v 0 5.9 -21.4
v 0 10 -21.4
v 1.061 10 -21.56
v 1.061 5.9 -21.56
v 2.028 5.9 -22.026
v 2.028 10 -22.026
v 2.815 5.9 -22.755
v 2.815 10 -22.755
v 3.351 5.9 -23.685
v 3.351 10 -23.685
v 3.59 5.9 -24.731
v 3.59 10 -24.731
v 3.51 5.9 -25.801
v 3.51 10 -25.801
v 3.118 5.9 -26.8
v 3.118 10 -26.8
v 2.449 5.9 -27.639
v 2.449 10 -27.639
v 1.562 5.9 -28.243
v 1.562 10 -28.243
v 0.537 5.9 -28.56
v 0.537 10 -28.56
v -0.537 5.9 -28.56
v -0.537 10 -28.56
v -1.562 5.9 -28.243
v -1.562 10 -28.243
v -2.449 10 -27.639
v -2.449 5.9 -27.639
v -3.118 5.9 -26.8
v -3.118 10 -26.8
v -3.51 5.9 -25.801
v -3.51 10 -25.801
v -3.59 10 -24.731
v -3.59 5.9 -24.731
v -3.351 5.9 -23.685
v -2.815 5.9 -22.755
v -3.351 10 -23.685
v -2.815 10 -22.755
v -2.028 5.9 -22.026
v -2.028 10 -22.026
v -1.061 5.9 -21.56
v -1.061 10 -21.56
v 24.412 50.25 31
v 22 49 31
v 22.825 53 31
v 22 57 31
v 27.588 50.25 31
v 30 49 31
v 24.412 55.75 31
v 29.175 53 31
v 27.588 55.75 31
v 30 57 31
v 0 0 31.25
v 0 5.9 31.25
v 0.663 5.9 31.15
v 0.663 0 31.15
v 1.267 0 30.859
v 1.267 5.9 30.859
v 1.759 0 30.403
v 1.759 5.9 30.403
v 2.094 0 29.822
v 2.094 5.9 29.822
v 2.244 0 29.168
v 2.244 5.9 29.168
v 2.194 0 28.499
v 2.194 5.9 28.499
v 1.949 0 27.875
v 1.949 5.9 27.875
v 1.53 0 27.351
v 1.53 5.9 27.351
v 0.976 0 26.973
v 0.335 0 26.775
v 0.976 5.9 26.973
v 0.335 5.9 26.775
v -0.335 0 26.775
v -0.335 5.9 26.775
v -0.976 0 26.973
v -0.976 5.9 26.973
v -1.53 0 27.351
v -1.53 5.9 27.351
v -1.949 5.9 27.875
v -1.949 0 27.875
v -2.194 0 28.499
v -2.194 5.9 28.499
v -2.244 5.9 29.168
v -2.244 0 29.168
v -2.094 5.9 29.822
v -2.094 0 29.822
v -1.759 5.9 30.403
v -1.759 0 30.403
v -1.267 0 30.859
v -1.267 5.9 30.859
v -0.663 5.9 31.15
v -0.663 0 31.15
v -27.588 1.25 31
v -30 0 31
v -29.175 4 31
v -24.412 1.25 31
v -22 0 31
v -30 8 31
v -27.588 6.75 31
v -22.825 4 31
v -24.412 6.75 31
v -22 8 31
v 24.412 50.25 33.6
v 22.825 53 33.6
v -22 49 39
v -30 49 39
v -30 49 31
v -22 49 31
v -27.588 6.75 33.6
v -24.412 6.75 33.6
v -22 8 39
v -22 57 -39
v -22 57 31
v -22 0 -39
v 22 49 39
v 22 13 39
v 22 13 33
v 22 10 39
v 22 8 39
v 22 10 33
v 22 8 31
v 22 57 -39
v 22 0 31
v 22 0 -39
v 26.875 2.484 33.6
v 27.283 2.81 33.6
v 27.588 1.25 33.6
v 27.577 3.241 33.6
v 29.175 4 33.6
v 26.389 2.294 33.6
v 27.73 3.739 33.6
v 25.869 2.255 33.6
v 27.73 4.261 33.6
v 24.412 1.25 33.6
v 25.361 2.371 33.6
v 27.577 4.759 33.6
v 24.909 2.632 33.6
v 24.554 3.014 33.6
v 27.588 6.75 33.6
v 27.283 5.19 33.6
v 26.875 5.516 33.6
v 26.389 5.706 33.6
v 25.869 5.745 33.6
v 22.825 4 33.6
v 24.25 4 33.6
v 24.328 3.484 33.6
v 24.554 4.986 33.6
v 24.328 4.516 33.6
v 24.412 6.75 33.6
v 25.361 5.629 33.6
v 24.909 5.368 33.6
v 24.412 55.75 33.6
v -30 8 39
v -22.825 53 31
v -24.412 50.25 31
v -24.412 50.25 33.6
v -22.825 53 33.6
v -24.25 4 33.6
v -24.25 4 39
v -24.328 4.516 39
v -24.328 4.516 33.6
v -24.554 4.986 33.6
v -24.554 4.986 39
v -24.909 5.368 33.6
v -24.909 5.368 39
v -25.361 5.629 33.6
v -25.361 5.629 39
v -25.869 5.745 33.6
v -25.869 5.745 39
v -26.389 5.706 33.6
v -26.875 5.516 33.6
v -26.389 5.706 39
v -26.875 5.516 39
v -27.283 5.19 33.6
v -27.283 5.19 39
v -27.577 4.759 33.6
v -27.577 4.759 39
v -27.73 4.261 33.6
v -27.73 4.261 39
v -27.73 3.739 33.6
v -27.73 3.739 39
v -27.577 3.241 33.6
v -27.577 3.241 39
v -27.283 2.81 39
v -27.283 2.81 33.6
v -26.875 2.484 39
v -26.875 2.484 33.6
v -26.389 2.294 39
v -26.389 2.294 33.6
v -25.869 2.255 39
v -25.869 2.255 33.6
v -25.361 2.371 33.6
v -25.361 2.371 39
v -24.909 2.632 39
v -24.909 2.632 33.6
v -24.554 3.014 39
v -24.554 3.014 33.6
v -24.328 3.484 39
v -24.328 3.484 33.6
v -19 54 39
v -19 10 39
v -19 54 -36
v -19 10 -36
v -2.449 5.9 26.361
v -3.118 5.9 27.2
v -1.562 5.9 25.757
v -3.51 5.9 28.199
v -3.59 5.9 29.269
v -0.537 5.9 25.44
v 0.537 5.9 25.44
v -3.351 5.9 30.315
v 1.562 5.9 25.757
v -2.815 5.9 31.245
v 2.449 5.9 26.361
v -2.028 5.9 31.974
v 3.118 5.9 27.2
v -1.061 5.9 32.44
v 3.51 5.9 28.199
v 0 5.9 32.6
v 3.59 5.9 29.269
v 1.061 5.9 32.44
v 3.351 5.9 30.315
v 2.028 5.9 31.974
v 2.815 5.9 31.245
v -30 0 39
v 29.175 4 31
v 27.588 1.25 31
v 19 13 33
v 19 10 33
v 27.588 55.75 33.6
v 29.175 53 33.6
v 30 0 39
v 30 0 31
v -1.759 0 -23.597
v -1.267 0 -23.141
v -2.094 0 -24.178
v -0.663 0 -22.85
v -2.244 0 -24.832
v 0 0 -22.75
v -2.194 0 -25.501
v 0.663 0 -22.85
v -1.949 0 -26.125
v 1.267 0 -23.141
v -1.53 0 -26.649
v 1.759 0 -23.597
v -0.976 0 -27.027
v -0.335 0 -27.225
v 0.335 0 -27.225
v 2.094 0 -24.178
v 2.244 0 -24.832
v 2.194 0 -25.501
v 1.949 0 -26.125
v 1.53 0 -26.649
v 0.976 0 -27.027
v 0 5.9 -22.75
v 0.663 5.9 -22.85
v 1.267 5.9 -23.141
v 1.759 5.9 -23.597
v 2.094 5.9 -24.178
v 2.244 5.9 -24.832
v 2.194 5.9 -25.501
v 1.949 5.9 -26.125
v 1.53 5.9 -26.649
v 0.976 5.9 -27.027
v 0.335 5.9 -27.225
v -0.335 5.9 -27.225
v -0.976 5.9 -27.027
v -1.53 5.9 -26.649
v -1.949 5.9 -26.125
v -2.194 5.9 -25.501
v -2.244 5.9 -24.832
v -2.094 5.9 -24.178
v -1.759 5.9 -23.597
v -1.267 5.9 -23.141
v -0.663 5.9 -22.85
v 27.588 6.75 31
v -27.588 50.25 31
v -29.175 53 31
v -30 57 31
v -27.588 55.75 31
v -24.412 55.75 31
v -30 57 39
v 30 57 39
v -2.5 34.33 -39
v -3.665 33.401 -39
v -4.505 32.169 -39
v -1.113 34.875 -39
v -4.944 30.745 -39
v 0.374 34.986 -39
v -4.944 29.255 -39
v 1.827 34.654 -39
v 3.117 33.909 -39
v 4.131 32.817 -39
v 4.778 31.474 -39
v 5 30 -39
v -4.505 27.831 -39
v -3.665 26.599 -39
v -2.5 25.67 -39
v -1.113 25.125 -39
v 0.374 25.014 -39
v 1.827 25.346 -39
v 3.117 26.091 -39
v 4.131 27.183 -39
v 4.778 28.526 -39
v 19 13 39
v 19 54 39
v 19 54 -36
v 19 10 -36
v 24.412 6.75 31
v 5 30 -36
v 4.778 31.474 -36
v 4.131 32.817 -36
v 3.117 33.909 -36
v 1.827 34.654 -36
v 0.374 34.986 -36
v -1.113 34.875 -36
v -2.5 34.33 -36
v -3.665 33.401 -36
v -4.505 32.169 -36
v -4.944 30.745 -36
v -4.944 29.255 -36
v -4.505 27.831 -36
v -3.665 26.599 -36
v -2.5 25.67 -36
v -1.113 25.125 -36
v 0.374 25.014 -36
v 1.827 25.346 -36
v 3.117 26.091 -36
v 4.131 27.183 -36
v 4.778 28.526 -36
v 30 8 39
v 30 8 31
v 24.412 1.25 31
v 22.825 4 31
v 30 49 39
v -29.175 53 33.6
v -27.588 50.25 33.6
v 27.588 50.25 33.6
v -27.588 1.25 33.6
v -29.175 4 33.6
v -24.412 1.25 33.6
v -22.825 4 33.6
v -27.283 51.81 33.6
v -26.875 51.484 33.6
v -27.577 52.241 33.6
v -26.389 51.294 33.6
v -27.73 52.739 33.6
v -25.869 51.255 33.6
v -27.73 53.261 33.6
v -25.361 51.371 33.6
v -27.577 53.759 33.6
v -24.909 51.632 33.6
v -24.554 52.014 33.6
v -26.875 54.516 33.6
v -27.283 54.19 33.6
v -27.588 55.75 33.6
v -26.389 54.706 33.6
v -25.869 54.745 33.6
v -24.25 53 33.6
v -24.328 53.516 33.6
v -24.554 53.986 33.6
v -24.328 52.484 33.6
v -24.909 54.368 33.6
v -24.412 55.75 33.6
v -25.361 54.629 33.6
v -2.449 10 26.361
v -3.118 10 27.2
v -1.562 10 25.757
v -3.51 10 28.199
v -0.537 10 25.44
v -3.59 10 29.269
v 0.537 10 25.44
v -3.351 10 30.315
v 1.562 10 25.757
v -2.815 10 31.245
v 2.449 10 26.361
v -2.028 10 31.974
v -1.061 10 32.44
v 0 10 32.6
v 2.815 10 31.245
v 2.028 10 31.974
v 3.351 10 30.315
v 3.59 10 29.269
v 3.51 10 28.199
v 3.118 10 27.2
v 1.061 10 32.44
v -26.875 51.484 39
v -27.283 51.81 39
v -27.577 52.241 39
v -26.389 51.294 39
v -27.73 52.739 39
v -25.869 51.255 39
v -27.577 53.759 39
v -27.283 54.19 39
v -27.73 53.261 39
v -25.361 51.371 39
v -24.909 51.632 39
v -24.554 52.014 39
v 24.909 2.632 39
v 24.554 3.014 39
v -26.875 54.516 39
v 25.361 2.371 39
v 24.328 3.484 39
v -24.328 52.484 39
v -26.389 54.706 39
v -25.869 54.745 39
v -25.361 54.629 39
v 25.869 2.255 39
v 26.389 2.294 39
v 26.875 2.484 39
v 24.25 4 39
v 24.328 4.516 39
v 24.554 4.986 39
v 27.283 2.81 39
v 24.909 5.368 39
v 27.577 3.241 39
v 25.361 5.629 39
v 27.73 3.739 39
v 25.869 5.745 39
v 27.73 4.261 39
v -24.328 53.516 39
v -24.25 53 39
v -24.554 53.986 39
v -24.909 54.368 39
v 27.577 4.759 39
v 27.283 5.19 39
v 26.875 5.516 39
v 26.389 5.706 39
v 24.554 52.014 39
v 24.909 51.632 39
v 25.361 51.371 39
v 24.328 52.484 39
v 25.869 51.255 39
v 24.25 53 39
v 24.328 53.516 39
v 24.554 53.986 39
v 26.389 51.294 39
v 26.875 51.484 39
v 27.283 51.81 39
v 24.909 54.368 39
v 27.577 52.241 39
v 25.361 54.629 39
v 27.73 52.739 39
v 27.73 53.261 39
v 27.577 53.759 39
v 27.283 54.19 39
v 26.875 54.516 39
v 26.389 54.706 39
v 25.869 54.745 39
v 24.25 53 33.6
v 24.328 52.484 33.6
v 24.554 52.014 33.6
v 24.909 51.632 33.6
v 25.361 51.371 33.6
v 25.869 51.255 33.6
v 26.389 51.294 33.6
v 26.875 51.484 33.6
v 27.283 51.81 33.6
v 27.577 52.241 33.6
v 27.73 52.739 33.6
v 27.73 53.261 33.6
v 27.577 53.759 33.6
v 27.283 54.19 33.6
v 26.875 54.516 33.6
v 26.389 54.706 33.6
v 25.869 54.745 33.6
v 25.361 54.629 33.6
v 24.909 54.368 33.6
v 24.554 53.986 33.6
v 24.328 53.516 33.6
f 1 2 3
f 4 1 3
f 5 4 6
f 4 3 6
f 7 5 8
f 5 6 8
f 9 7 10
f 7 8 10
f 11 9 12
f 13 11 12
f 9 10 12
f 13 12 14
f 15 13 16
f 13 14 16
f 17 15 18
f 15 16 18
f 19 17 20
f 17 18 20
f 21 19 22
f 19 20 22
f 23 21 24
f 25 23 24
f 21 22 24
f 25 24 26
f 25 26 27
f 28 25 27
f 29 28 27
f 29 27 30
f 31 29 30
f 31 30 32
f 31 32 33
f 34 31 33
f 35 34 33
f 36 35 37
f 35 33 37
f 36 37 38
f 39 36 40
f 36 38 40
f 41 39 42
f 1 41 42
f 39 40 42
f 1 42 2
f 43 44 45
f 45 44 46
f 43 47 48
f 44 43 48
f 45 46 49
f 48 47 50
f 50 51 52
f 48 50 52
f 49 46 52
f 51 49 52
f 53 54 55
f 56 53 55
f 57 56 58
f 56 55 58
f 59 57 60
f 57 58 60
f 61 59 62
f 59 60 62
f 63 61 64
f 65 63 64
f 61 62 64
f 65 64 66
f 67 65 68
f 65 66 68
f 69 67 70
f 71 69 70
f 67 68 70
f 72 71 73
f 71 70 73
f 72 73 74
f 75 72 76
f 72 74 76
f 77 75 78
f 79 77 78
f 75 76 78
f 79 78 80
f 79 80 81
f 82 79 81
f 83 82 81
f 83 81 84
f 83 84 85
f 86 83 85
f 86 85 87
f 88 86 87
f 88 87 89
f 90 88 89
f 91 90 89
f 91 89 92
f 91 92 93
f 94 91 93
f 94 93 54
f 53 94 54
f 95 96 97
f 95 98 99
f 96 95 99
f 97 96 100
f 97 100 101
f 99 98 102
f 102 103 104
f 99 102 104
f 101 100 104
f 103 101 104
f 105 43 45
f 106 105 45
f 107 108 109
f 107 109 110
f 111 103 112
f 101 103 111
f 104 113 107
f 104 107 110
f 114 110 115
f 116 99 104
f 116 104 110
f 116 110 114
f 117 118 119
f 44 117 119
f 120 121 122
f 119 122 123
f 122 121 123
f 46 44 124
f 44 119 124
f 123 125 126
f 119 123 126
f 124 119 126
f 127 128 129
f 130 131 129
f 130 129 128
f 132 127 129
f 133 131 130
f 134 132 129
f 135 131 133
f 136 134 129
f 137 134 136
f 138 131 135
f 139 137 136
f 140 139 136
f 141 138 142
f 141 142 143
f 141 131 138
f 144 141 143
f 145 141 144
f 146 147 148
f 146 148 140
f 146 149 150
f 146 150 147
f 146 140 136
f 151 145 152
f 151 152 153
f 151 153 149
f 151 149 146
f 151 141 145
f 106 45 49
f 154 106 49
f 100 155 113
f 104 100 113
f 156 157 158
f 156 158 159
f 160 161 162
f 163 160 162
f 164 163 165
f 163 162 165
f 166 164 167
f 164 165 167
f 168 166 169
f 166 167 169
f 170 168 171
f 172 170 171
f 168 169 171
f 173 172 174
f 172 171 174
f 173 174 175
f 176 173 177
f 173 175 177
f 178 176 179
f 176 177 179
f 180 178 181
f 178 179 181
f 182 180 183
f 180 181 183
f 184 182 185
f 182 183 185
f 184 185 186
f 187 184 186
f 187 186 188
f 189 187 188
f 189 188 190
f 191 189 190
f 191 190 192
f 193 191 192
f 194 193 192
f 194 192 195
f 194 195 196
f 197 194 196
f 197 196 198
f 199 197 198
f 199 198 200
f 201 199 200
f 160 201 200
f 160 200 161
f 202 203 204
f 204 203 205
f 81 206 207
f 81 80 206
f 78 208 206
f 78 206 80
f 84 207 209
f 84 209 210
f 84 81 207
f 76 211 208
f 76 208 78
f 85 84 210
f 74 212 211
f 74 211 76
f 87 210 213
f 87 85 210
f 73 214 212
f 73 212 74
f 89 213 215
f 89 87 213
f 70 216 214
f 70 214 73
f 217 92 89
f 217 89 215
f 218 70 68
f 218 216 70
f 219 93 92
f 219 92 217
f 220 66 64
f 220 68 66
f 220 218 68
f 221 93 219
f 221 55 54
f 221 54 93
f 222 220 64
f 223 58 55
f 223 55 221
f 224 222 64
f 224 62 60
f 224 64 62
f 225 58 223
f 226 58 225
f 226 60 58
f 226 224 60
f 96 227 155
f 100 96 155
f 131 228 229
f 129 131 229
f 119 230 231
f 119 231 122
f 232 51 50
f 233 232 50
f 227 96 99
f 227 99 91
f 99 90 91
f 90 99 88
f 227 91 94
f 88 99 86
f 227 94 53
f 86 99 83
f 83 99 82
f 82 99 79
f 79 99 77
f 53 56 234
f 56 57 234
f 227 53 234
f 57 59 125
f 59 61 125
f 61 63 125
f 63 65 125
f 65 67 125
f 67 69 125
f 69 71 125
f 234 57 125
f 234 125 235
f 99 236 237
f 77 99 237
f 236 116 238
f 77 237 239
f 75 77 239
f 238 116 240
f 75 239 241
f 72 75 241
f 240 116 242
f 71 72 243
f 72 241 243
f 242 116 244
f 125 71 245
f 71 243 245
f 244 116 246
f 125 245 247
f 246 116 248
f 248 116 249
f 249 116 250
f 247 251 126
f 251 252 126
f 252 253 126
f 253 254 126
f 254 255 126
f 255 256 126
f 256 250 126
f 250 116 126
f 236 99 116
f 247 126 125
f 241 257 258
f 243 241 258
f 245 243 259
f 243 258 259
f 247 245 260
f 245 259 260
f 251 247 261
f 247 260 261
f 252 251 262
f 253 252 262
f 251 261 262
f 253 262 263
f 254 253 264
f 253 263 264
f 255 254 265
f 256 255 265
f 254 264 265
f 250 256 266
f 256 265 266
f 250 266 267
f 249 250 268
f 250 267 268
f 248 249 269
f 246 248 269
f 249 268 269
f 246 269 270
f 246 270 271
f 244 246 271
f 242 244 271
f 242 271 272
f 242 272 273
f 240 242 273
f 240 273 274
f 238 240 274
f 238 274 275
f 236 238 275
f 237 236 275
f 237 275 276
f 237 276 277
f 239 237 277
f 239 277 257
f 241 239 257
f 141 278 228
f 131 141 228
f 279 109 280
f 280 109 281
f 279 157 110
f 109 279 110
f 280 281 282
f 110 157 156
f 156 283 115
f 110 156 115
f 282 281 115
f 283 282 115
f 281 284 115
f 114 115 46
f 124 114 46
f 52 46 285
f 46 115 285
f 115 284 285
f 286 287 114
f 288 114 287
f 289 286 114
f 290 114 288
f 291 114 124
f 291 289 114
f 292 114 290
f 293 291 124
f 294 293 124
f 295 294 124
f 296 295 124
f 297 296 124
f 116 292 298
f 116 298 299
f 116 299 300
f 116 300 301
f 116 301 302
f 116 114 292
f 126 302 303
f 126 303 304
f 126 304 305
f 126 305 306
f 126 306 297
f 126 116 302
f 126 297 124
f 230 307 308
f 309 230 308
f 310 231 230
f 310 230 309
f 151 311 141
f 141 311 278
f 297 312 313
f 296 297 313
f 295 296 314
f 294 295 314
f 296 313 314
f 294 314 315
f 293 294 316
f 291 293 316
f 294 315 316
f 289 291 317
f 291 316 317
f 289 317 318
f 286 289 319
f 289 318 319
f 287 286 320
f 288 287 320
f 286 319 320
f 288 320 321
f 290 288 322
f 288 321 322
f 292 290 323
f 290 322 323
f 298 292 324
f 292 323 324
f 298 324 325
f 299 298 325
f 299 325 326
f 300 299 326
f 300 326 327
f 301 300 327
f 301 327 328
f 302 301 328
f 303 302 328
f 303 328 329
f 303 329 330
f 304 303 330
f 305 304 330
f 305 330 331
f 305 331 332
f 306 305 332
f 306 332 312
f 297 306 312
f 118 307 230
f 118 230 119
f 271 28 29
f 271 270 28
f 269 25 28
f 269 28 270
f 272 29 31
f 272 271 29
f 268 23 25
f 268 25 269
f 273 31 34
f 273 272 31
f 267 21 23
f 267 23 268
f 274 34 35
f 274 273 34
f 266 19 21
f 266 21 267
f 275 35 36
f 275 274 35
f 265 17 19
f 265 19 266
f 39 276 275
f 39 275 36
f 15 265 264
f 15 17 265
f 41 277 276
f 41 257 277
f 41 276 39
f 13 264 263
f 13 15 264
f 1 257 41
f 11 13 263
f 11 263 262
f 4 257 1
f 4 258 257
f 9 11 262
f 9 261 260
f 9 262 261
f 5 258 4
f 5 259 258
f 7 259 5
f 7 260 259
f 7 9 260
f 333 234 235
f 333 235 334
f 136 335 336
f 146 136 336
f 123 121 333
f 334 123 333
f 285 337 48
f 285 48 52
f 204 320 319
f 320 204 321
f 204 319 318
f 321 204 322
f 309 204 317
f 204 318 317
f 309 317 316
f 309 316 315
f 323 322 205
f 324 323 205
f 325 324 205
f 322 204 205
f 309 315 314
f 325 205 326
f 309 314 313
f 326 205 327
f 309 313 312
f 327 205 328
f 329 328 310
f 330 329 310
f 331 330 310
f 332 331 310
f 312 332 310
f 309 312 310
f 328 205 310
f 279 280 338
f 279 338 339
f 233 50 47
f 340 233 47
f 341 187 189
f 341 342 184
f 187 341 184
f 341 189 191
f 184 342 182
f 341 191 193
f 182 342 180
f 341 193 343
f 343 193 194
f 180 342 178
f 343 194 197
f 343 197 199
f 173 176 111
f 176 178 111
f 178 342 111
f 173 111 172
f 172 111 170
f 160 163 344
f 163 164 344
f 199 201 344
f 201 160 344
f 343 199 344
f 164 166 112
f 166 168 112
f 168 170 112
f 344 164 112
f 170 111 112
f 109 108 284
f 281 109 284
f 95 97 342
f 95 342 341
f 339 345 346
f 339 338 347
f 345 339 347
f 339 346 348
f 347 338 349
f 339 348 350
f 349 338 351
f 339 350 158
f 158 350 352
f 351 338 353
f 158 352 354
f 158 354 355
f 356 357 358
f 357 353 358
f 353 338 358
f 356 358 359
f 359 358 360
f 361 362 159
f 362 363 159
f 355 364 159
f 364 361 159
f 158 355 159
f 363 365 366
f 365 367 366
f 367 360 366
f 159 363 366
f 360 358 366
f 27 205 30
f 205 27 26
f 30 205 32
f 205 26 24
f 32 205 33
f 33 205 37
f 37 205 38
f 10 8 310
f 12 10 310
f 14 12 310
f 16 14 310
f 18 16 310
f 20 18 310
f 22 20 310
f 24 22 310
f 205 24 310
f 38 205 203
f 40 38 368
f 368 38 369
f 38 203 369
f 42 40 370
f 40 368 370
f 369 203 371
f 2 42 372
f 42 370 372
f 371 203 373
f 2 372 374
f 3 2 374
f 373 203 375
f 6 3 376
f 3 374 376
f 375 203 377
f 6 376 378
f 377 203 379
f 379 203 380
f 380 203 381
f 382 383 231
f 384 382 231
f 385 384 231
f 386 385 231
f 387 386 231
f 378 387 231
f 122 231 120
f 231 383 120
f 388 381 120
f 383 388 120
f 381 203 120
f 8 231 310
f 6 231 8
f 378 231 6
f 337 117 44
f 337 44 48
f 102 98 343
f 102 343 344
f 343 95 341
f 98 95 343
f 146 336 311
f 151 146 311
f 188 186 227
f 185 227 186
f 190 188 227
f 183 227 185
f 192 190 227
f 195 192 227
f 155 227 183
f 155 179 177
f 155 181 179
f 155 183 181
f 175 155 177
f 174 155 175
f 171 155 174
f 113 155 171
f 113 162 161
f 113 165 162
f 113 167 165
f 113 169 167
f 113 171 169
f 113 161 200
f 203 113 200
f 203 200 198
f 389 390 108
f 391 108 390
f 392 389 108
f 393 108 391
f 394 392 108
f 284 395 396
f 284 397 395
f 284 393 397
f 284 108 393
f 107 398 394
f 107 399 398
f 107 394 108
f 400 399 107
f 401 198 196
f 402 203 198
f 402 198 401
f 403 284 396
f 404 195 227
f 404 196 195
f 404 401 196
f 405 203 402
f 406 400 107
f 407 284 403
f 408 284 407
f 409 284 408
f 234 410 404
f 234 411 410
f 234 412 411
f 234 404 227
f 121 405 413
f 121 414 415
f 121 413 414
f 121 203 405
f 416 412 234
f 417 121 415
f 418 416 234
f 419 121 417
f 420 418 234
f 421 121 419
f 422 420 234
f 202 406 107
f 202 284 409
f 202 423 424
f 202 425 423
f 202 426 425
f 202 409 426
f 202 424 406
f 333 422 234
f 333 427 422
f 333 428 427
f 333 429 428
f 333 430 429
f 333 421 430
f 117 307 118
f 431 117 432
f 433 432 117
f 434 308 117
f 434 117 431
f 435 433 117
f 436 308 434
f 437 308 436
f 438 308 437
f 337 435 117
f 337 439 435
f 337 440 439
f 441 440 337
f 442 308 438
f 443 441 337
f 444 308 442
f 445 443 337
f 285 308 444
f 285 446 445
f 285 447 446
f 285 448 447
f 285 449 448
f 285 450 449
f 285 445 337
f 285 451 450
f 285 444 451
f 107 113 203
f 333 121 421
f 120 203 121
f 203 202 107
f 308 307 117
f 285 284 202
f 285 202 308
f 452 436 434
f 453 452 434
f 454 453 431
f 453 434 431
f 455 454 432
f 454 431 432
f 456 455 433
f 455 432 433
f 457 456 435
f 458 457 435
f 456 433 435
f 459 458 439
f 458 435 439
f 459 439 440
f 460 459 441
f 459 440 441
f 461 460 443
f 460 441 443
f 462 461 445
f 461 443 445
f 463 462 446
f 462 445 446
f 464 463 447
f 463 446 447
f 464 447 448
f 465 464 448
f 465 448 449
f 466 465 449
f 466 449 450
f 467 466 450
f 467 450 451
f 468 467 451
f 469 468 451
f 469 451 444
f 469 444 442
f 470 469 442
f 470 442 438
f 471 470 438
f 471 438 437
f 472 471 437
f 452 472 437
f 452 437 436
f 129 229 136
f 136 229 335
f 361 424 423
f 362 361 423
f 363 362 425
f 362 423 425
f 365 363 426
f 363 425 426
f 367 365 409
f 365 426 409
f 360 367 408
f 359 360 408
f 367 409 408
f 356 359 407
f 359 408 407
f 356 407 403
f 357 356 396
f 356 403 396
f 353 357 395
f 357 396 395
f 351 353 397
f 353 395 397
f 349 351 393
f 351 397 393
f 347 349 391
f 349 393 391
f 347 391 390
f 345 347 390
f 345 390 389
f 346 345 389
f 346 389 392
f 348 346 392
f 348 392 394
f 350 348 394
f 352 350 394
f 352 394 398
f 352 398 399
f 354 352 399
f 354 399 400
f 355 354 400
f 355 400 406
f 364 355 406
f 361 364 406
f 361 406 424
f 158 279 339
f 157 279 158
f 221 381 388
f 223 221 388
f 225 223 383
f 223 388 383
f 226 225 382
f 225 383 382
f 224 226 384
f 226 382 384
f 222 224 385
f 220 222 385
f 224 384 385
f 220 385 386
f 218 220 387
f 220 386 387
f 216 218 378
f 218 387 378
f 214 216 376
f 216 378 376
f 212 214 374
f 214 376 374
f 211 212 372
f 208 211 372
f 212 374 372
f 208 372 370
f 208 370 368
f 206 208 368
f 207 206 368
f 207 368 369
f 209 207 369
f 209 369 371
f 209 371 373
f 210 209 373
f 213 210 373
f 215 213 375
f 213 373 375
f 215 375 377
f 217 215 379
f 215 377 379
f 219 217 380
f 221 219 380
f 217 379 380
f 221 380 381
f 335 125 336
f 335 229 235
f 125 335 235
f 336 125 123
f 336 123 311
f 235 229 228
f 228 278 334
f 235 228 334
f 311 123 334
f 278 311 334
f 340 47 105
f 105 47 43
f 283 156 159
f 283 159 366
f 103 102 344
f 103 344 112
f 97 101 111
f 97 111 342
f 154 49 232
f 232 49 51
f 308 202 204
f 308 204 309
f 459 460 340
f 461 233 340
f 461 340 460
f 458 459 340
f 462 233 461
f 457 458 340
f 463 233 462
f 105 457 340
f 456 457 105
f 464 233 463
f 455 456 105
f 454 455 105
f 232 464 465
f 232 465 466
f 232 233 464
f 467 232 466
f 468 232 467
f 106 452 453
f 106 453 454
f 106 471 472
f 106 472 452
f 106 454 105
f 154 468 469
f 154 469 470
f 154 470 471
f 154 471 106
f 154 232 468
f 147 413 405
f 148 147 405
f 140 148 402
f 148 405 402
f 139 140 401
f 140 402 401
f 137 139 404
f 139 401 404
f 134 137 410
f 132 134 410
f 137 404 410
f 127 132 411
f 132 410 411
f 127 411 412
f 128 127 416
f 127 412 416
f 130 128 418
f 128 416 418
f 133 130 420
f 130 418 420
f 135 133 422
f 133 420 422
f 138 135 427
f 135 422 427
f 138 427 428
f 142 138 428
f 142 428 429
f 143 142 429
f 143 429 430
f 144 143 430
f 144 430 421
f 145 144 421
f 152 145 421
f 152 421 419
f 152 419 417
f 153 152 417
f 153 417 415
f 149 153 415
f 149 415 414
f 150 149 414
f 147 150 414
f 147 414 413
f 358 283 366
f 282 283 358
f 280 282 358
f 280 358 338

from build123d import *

# Parameters (mm, degrees)
SKETCH_1_W                 = 44
SKETCH_1_H                 = 78
EXTRUDE_1_DEPTH            = 57
SHELL_1_T                  = -3
SHELL_1_THICKNESS_2_FACE_W = 75
SHELL_1_THICKNESS_2_FACE_H = 38
SHELL_1_THICKNESS_2_DEPTH  = 7
SKETCH_3_R                 = 3.6
CUT_EXTRUDE_1_DEPTH        = 4.1
CUT_EXTRUDE_2_REACH        = 66.915
SKETCH_4_R                 = 2.25
SKETCH_5_W                 = 3
SKETCH_5_H                 = 3
CUT_EXTRUDE_3_DEPTH        = 6
SKETCH_6_W                 = 8
SKETCH_6_H                 = 8
SKETCH_6_R                 = 1.75
EXTRUDE_2_DEPTH            = 8
CUT_EXTRUDE_4_DEPTH        = 2.6
CUT_EXTRUDE_5_REACH        = 100.864
SKETCH_8_R                 = 5


with BuildPart() as part:
    # 草圖1 → 填料-伸長1 (new body)
    with BuildSketch(Plane(origin=(0, 0, 0), x_dir=(1, 0, 0), z_dir=(0, 1, 0))):
        Rectangle(SKETCH_1_W, SKETCH_1_H)
    extrude(amount=EXTRUDE_1_DEPTH)

    # 薄殼1
    shell_1_openings = [part.faces().sort_by_distance(p)[0] for p in [
        (0, 28.5, 39),
    ]]
    offset(amount=SHELL_1_T, openings=shell_1_openings, kind=Kind.INTERSECTION)

    # 薄殼1 thickness 2 face (on inner face of the shell) → 薄殼1 thickness 2 (add)
    with BuildSketch(Plane(origin=(0, 3, 1.5), x_dir=(0, 0, -1), z_dir=(0, -1, 0))):
        Rectangle(SHELL_1_THICKNESS_2_FACE_W, SHELL_1_THICKNESS_2_FACE_H)
    extrude(amount=-SHELL_1_THICKNESS_2_DEPTH)

    # 草圖3 → 除料-伸長1 (cut)
    with BuildSketch(Plane(origin=(0, 10, 0), x_dir=(1, 0, 0), z_dir=(0, 1, 0))):
        with Locations(Location((0, 25, 0), (0, 0, 270))):
            Circle(SKETCH_3_R)
        with Locations(Location((0, -29, 0), (0, 0, 270))):
            Circle(SKETCH_3_R)
    extrude(amount=-CUT_EXTRUDE_1_DEPTH, mode=Mode.SUBTRACT)

    # 草圖4 → 除料-伸長2 (cut, up to next)
    with BuildSketch(Plane(origin=(0, 10, 0), x_dir=(1, 0, 0), z_dir=(0, 1, 0)), mode=Mode.PRIVATE) as cut_extrude_2_sk1:
        with Locations(Location((0, 25, 0), (0, 0, 270))):
            Circle(SKETCH_4_R)
    cut_extrude_2_tool1 = extrude(cut_extrude_2_sk1.sketch, amount=-CUT_EXTRUDE_2_REACH, mode=Mode.PRIVATE) & part.part
    # 草圖4 → 除料-伸長2 (cut, up to next)
    with BuildSketch(Plane(origin=(0, 10, 0), x_dir=(1, 0, 0), z_dir=(0, 1, 0)), mode=Mode.PRIVATE) as cut_extrude_2_sk2:
        with Locations(Location((0, -29, 0), (0, 0, 270))):
            Circle(SKETCH_4_R)
    cut_extrude_2_tool2 = extrude(cut_extrude_2_sk2.sketch, amount=-CUT_EXTRUDE_2_REACH, mode=Mode.PRIVATE) & part.part
    add(cut_extrude_2_tool1.solids().sort_by_distance((0, 10, -25))[0], mode=Mode.SUBTRACT)
    add(cut_extrude_2_tool2.solids().sort_by_distance((0, 10, 29))[0], mode=Mode.SUBTRACT)

    # 草圖5 → 除料-伸長3 (cut)
    with BuildSketch(Plane.XY.offset(39)):
        with Locations((20.5, 11.5)):
            Rectangle(SKETCH_5_W, SKETCH_5_H)
    extrude(amount=-CUT_EXTRUDE_3_DEPTH, mode=Mode.SUBTRACT)

    # 草圖6 → 填料-伸長2 (add)
    with BuildSketch(Plane.XY.offset(39)):
        with Locations((-26, 53)):
            Rectangle(SKETCH_6_W, SKETCH_6_H)
        with Locations((-26, 53)):
            Circle(SKETCH_6_R, mode=Mode.SUBTRACT)
        with Locations((-26, 4)):
            Rectangle(SKETCH_6_W, SKETCH_6_H)
        with Locations((-26, 4)):
            Circle(SKETCH_6_R, mode=Mode.SUBTRACT)
        with Locations((26, 4)):
            Rectangle(SKETCH_6_W, SKETCH_6_H)
        with Locations(Location((26, 4, 0), (0, 0, 180))):
            Circle(SKETCH_6_R, mode=Mode.SUBTRACT)
        with Locations((26, 53)):
            Rectangle(SKETCH_6_W, SKETCH_6_H)
        with Locations(Location((26, 53, 0), (0, 0, 180))):
            Circle(SKETCH_6_R, mode=Mode.SUBTRACT)
    extrude(amount=-EXTRUDE_2_DEPTH)

    # 草圖7 → 除料-伸長4 (cut)
    with BuildSketch(Plane(origin=(0, 0, 31), x_dir=(-1, 0, 0), z_dir=(0, 0, -1))):
        Polygon((-22.824573519, 53), (-24.41228676, 55.75), (-27.58771324, 55.75), (-29.175426481, 53), (-27.58771324, 50.25), (-24.41228676, 50.25), align=None)
        Polygon((-22.824573519, 4), (-24.41228676, 6.75), (-27.58771324, 6.75), (-29.175426481, 4), (-27.58771324, 1.25), (-24.41228676, 1.25), align=None)
        Polygon((24.41228676, 1.25), (22.824573519, 4), (24.41228676, 6.75), (27.58771324, 6.75), (29.175426481, 4), (27.58771324, 1.25), align=None)
        Polygon((24.41228676, 50.25), (22.824573519, 53), (24.41228676, 55.75), (27.58771324, 55.75), (29.175426481, 53), (27.58771324, 50.25), align=None)
    extrude(amount=-CUT_EXTRUDE_4_DEPTH, mode=Mode.SUBTRACT)

    # 草圖8 → 除料-伸長5 (cut, up to next)
    with BuildSketch(Plane.XY.offset(-36), mode=Mode.PRIVATE) as cut_extrude_5_sk1:
        with Locations((0, 30)):
            Circle(SKETCH_8_R)
    cut_extrude_5_tool1 = extrude(cut_extrude_5_sk1.sketch, amount=-CUT_EXTRUDE_5_REACH, mode=Mode.PRIVATE) & part.part
    add(cut_extrude_5_tool1.solids().sort_by_distance((0, 30, -36))[0], mode=Mode.SUBTRACT)


solid = part.part
